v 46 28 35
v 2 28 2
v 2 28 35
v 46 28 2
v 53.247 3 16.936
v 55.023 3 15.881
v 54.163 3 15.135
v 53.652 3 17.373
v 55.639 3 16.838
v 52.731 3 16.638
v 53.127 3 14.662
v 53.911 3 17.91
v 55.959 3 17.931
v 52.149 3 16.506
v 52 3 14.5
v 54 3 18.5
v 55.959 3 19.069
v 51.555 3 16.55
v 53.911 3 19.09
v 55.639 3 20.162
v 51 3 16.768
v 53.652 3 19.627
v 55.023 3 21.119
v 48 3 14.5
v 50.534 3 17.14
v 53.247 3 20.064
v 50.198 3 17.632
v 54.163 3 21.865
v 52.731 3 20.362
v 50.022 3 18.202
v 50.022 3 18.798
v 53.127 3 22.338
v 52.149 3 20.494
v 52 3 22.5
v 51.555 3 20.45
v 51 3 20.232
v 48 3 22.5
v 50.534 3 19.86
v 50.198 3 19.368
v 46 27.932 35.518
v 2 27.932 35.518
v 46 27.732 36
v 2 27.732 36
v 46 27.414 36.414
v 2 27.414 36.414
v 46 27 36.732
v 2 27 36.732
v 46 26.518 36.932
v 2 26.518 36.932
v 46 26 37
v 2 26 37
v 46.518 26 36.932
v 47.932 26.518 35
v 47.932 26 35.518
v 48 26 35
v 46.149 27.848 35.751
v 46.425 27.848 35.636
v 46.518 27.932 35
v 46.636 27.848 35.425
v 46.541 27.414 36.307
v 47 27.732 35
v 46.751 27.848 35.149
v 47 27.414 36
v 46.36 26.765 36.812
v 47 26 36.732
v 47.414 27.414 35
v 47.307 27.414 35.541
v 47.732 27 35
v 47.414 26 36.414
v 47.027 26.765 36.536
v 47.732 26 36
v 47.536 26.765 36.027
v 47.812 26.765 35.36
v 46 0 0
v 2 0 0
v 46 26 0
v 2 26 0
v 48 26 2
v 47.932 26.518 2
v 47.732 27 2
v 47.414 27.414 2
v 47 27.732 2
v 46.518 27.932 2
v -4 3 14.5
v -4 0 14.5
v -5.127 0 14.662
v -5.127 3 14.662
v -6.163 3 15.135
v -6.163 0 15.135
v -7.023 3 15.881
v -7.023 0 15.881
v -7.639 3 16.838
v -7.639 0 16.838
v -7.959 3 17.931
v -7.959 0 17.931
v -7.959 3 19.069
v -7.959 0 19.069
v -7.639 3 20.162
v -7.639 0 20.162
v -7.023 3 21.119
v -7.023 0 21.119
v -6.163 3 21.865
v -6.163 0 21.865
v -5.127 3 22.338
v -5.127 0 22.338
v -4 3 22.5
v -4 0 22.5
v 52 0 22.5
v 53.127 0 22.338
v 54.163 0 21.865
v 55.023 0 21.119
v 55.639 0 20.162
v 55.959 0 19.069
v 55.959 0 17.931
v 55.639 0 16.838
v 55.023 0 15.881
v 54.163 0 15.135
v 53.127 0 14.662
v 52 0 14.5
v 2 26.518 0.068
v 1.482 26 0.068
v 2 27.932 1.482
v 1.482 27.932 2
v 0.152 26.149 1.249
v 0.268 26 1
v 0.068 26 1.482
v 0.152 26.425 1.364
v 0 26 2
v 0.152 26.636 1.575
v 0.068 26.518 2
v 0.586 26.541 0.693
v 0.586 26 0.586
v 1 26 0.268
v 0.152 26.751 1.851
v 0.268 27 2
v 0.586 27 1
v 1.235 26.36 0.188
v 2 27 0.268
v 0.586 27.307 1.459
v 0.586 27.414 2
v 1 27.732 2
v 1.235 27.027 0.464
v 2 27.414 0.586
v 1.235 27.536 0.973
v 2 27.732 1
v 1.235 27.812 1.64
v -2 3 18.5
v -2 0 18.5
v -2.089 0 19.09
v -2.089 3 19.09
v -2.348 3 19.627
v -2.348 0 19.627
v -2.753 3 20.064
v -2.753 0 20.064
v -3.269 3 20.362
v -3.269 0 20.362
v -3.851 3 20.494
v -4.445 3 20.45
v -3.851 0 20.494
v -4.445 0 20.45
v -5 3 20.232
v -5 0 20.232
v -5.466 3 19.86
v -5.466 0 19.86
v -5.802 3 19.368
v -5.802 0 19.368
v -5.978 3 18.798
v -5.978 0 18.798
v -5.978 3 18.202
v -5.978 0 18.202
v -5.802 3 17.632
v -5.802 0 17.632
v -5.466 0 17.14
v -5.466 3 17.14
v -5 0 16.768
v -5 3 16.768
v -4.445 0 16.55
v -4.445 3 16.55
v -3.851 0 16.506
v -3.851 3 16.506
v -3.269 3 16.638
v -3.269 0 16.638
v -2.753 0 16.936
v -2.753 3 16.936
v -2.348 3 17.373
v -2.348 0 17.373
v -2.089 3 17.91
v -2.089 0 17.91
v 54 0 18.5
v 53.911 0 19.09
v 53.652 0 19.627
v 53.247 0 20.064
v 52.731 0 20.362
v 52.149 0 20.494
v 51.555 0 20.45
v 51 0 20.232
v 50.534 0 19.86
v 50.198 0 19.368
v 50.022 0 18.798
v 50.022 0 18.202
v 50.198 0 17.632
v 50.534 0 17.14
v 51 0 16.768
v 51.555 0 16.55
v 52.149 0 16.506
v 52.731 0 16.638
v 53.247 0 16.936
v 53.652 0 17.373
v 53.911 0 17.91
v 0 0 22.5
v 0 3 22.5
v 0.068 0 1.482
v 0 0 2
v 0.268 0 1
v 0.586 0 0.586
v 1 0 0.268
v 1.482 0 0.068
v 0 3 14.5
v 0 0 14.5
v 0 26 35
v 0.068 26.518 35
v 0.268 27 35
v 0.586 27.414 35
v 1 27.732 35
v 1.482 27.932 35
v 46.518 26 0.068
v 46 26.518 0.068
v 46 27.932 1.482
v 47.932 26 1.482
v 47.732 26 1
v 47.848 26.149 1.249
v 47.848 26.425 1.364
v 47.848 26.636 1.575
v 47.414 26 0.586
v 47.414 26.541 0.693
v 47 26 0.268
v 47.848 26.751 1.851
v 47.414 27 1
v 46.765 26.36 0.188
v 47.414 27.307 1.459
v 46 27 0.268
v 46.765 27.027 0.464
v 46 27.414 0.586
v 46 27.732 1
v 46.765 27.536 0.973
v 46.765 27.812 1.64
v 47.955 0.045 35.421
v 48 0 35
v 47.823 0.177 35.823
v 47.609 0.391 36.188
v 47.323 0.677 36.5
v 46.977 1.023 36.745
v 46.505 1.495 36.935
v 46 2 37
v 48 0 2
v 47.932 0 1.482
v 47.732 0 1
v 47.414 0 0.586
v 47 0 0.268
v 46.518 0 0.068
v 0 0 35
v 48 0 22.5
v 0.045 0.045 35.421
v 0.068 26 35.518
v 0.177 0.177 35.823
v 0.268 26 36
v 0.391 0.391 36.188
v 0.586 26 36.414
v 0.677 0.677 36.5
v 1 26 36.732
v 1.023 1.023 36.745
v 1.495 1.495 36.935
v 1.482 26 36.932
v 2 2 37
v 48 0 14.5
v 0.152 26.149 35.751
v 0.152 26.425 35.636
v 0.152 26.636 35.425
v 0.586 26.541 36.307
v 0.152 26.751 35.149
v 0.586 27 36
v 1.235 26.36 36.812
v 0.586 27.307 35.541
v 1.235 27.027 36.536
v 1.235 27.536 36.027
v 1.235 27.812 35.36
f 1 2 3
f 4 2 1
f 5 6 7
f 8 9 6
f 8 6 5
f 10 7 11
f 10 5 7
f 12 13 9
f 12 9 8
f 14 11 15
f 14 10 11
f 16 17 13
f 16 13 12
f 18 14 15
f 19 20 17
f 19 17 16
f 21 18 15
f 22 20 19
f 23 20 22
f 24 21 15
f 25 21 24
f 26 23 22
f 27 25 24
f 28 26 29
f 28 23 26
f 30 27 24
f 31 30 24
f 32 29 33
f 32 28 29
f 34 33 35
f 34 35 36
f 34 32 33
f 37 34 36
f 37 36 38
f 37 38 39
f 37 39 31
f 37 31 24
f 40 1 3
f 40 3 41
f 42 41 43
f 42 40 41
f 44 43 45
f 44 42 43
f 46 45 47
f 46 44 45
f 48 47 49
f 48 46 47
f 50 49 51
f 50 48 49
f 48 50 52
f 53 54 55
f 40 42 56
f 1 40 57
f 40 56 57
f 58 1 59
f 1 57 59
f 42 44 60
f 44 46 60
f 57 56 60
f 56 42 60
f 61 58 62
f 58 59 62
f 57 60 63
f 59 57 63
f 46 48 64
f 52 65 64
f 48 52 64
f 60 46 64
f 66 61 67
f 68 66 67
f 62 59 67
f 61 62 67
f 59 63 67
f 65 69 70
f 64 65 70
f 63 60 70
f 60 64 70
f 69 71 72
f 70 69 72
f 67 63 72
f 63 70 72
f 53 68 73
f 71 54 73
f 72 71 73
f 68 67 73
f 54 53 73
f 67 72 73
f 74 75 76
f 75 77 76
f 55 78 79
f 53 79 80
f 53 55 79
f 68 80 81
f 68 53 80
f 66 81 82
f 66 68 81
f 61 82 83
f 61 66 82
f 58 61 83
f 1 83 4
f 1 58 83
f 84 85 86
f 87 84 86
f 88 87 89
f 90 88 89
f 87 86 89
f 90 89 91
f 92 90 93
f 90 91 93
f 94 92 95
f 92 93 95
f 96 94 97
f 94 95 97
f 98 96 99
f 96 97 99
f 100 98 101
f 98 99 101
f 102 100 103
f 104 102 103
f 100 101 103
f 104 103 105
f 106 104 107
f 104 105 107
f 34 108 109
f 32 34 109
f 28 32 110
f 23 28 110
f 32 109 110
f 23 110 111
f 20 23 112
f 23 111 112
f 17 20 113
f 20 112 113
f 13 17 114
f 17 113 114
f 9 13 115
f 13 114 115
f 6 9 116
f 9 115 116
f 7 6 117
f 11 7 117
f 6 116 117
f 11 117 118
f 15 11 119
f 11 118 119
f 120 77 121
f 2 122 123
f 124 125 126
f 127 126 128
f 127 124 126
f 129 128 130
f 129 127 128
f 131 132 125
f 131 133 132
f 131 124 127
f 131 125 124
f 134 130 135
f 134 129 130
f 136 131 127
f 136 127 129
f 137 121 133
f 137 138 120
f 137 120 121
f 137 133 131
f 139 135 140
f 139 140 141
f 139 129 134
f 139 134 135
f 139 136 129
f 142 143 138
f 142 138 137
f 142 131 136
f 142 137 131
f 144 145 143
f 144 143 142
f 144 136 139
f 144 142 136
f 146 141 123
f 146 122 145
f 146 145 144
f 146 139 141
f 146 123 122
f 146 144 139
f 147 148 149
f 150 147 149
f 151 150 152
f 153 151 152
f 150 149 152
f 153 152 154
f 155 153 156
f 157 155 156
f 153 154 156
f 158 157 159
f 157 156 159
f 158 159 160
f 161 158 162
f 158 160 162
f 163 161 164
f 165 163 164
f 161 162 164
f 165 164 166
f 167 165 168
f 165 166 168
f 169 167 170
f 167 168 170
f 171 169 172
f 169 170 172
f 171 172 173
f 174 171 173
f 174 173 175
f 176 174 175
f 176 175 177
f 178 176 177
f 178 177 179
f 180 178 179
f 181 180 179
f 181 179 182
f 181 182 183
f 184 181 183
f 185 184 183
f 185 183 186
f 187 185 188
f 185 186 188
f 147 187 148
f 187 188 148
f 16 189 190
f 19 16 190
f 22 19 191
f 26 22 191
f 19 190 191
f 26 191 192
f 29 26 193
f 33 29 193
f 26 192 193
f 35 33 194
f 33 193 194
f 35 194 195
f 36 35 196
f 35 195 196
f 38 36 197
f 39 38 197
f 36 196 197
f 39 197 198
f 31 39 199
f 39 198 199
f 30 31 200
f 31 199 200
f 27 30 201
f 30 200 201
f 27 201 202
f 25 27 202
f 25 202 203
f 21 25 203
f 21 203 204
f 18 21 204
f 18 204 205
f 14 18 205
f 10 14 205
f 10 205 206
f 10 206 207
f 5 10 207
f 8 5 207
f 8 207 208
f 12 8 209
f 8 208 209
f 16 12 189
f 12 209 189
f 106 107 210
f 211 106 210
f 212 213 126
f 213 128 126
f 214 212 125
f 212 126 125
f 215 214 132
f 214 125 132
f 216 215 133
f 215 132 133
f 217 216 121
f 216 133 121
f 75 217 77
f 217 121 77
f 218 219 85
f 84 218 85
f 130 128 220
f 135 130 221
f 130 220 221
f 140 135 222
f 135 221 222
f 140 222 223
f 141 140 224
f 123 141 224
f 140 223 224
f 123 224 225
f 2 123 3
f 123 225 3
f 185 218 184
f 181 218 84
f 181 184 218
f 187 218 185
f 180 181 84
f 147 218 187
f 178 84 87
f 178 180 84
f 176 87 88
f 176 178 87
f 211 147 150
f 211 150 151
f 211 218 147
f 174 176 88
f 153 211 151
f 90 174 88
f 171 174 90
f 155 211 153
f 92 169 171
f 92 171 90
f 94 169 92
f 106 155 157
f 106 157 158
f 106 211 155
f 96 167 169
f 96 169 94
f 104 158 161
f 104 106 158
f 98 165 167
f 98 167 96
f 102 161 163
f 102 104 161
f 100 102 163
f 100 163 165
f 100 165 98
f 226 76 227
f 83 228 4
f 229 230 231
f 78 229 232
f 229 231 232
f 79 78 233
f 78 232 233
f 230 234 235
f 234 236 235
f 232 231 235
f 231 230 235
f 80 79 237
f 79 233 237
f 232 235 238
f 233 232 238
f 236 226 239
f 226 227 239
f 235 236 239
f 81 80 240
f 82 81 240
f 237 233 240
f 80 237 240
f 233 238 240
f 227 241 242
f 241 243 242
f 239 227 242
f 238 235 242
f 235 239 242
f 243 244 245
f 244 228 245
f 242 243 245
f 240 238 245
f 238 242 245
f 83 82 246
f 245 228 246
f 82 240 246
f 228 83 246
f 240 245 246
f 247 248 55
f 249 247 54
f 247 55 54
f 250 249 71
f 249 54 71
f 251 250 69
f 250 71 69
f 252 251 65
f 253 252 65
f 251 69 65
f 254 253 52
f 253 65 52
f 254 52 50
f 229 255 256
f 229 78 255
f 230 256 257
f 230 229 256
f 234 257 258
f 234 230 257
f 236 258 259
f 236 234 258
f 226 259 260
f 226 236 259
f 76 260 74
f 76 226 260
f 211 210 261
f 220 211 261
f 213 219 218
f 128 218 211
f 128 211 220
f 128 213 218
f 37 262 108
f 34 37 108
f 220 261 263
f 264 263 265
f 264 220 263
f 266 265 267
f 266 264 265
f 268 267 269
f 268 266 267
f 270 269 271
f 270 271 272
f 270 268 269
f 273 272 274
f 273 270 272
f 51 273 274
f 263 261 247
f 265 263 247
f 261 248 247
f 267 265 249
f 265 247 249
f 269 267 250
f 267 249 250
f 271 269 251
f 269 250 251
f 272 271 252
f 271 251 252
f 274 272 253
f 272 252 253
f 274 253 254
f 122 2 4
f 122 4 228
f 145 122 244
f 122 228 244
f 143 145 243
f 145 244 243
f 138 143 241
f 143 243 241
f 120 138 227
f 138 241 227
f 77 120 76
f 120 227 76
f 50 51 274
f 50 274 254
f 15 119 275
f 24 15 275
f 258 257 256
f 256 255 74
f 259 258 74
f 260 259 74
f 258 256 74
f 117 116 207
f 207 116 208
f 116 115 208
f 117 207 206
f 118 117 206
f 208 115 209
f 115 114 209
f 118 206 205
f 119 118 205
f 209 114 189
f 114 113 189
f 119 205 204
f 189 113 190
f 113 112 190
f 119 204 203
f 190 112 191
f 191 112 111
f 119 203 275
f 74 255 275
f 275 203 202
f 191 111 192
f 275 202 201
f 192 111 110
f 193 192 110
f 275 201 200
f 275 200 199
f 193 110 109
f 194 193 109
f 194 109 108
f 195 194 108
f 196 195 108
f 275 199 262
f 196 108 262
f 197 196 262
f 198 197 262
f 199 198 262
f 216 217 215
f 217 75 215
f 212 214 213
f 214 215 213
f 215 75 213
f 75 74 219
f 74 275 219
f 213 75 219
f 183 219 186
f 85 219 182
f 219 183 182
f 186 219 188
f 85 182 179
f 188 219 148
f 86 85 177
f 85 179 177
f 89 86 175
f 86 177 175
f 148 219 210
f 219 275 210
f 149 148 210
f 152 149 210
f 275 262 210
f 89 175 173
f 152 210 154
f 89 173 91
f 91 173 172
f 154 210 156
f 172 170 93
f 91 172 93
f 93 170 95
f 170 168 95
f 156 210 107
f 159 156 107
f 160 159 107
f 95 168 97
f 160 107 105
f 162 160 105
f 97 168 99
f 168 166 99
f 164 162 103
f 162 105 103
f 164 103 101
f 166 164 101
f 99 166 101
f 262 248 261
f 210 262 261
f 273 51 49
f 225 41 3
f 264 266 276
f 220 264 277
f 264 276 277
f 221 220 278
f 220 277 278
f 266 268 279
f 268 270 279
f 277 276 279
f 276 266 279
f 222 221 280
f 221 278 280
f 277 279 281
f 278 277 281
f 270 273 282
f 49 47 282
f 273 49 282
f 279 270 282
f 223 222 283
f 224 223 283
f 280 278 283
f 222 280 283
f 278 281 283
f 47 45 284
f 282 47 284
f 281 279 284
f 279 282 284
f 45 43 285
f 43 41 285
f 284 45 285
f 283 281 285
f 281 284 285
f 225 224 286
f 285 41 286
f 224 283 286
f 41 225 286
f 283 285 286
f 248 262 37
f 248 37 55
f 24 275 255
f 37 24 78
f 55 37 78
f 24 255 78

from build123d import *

# Parameters (mm, degrees)
SKETCH_1_W      = 48
SKETCH_1_H      = 28
EXTRUDE_1_DEPTH = 37
FILLET_1_R      = 2
SKETCH_2_R      = 2
EXTRUDE_2_DEPTH = 3


with BuildPart() as part:
    # 草图1 → 凸台-拉伸1 (new body)
    with BuildSketch(Plane.XY):
        with Locations((24, 14)):
            Rectangle(SKETCH_1_W, SKETCH_1_H)
    extrude(amount=EXTRUDE_1_DEPTH)

    # 圆角1
    fillet_1_edges = [part.edges().sort_by_distance(p)[0] for p in [
        (48, 14, 37),
        (24, 28, 37),
        (0, 14, 37),
        (24, 28, 0),
        (48, 14, 0),
        (0, 14, 0),
        (0, 28, 18.5),
        (48, 28, 18.5),
        (24, 0, 37),
    ]]
    fillet(fillet_1_edges, radius=FILLET_1_R)

    # 草图2 → 凸台-拉伸2 (add)
    with BuildSketch(Plane.XZ):
        with BuildLine():
            Line((-4, 22.5), (52, 22.5))
            ThreePointArc((52, 22.5), (56, 18.5), (52, 14.5))
            Line((52, 14.5), (-4, 14.5))
            ThreePointArc((-4, 14.5), (-8, 18.5), (-4, 22.5))
        make_face()
        with Locations((-4, 18.5)):
            Circle(SKETCH_2_R, mode=Mode.SUBTRACT)
        with Locations((52, 18.5)):
            Circle(SKETCH_2_R, mode=Mode.SUBTRACT)
    extrude(amount=-EXTRUDE_2_DEPTH)


solid = part.part
